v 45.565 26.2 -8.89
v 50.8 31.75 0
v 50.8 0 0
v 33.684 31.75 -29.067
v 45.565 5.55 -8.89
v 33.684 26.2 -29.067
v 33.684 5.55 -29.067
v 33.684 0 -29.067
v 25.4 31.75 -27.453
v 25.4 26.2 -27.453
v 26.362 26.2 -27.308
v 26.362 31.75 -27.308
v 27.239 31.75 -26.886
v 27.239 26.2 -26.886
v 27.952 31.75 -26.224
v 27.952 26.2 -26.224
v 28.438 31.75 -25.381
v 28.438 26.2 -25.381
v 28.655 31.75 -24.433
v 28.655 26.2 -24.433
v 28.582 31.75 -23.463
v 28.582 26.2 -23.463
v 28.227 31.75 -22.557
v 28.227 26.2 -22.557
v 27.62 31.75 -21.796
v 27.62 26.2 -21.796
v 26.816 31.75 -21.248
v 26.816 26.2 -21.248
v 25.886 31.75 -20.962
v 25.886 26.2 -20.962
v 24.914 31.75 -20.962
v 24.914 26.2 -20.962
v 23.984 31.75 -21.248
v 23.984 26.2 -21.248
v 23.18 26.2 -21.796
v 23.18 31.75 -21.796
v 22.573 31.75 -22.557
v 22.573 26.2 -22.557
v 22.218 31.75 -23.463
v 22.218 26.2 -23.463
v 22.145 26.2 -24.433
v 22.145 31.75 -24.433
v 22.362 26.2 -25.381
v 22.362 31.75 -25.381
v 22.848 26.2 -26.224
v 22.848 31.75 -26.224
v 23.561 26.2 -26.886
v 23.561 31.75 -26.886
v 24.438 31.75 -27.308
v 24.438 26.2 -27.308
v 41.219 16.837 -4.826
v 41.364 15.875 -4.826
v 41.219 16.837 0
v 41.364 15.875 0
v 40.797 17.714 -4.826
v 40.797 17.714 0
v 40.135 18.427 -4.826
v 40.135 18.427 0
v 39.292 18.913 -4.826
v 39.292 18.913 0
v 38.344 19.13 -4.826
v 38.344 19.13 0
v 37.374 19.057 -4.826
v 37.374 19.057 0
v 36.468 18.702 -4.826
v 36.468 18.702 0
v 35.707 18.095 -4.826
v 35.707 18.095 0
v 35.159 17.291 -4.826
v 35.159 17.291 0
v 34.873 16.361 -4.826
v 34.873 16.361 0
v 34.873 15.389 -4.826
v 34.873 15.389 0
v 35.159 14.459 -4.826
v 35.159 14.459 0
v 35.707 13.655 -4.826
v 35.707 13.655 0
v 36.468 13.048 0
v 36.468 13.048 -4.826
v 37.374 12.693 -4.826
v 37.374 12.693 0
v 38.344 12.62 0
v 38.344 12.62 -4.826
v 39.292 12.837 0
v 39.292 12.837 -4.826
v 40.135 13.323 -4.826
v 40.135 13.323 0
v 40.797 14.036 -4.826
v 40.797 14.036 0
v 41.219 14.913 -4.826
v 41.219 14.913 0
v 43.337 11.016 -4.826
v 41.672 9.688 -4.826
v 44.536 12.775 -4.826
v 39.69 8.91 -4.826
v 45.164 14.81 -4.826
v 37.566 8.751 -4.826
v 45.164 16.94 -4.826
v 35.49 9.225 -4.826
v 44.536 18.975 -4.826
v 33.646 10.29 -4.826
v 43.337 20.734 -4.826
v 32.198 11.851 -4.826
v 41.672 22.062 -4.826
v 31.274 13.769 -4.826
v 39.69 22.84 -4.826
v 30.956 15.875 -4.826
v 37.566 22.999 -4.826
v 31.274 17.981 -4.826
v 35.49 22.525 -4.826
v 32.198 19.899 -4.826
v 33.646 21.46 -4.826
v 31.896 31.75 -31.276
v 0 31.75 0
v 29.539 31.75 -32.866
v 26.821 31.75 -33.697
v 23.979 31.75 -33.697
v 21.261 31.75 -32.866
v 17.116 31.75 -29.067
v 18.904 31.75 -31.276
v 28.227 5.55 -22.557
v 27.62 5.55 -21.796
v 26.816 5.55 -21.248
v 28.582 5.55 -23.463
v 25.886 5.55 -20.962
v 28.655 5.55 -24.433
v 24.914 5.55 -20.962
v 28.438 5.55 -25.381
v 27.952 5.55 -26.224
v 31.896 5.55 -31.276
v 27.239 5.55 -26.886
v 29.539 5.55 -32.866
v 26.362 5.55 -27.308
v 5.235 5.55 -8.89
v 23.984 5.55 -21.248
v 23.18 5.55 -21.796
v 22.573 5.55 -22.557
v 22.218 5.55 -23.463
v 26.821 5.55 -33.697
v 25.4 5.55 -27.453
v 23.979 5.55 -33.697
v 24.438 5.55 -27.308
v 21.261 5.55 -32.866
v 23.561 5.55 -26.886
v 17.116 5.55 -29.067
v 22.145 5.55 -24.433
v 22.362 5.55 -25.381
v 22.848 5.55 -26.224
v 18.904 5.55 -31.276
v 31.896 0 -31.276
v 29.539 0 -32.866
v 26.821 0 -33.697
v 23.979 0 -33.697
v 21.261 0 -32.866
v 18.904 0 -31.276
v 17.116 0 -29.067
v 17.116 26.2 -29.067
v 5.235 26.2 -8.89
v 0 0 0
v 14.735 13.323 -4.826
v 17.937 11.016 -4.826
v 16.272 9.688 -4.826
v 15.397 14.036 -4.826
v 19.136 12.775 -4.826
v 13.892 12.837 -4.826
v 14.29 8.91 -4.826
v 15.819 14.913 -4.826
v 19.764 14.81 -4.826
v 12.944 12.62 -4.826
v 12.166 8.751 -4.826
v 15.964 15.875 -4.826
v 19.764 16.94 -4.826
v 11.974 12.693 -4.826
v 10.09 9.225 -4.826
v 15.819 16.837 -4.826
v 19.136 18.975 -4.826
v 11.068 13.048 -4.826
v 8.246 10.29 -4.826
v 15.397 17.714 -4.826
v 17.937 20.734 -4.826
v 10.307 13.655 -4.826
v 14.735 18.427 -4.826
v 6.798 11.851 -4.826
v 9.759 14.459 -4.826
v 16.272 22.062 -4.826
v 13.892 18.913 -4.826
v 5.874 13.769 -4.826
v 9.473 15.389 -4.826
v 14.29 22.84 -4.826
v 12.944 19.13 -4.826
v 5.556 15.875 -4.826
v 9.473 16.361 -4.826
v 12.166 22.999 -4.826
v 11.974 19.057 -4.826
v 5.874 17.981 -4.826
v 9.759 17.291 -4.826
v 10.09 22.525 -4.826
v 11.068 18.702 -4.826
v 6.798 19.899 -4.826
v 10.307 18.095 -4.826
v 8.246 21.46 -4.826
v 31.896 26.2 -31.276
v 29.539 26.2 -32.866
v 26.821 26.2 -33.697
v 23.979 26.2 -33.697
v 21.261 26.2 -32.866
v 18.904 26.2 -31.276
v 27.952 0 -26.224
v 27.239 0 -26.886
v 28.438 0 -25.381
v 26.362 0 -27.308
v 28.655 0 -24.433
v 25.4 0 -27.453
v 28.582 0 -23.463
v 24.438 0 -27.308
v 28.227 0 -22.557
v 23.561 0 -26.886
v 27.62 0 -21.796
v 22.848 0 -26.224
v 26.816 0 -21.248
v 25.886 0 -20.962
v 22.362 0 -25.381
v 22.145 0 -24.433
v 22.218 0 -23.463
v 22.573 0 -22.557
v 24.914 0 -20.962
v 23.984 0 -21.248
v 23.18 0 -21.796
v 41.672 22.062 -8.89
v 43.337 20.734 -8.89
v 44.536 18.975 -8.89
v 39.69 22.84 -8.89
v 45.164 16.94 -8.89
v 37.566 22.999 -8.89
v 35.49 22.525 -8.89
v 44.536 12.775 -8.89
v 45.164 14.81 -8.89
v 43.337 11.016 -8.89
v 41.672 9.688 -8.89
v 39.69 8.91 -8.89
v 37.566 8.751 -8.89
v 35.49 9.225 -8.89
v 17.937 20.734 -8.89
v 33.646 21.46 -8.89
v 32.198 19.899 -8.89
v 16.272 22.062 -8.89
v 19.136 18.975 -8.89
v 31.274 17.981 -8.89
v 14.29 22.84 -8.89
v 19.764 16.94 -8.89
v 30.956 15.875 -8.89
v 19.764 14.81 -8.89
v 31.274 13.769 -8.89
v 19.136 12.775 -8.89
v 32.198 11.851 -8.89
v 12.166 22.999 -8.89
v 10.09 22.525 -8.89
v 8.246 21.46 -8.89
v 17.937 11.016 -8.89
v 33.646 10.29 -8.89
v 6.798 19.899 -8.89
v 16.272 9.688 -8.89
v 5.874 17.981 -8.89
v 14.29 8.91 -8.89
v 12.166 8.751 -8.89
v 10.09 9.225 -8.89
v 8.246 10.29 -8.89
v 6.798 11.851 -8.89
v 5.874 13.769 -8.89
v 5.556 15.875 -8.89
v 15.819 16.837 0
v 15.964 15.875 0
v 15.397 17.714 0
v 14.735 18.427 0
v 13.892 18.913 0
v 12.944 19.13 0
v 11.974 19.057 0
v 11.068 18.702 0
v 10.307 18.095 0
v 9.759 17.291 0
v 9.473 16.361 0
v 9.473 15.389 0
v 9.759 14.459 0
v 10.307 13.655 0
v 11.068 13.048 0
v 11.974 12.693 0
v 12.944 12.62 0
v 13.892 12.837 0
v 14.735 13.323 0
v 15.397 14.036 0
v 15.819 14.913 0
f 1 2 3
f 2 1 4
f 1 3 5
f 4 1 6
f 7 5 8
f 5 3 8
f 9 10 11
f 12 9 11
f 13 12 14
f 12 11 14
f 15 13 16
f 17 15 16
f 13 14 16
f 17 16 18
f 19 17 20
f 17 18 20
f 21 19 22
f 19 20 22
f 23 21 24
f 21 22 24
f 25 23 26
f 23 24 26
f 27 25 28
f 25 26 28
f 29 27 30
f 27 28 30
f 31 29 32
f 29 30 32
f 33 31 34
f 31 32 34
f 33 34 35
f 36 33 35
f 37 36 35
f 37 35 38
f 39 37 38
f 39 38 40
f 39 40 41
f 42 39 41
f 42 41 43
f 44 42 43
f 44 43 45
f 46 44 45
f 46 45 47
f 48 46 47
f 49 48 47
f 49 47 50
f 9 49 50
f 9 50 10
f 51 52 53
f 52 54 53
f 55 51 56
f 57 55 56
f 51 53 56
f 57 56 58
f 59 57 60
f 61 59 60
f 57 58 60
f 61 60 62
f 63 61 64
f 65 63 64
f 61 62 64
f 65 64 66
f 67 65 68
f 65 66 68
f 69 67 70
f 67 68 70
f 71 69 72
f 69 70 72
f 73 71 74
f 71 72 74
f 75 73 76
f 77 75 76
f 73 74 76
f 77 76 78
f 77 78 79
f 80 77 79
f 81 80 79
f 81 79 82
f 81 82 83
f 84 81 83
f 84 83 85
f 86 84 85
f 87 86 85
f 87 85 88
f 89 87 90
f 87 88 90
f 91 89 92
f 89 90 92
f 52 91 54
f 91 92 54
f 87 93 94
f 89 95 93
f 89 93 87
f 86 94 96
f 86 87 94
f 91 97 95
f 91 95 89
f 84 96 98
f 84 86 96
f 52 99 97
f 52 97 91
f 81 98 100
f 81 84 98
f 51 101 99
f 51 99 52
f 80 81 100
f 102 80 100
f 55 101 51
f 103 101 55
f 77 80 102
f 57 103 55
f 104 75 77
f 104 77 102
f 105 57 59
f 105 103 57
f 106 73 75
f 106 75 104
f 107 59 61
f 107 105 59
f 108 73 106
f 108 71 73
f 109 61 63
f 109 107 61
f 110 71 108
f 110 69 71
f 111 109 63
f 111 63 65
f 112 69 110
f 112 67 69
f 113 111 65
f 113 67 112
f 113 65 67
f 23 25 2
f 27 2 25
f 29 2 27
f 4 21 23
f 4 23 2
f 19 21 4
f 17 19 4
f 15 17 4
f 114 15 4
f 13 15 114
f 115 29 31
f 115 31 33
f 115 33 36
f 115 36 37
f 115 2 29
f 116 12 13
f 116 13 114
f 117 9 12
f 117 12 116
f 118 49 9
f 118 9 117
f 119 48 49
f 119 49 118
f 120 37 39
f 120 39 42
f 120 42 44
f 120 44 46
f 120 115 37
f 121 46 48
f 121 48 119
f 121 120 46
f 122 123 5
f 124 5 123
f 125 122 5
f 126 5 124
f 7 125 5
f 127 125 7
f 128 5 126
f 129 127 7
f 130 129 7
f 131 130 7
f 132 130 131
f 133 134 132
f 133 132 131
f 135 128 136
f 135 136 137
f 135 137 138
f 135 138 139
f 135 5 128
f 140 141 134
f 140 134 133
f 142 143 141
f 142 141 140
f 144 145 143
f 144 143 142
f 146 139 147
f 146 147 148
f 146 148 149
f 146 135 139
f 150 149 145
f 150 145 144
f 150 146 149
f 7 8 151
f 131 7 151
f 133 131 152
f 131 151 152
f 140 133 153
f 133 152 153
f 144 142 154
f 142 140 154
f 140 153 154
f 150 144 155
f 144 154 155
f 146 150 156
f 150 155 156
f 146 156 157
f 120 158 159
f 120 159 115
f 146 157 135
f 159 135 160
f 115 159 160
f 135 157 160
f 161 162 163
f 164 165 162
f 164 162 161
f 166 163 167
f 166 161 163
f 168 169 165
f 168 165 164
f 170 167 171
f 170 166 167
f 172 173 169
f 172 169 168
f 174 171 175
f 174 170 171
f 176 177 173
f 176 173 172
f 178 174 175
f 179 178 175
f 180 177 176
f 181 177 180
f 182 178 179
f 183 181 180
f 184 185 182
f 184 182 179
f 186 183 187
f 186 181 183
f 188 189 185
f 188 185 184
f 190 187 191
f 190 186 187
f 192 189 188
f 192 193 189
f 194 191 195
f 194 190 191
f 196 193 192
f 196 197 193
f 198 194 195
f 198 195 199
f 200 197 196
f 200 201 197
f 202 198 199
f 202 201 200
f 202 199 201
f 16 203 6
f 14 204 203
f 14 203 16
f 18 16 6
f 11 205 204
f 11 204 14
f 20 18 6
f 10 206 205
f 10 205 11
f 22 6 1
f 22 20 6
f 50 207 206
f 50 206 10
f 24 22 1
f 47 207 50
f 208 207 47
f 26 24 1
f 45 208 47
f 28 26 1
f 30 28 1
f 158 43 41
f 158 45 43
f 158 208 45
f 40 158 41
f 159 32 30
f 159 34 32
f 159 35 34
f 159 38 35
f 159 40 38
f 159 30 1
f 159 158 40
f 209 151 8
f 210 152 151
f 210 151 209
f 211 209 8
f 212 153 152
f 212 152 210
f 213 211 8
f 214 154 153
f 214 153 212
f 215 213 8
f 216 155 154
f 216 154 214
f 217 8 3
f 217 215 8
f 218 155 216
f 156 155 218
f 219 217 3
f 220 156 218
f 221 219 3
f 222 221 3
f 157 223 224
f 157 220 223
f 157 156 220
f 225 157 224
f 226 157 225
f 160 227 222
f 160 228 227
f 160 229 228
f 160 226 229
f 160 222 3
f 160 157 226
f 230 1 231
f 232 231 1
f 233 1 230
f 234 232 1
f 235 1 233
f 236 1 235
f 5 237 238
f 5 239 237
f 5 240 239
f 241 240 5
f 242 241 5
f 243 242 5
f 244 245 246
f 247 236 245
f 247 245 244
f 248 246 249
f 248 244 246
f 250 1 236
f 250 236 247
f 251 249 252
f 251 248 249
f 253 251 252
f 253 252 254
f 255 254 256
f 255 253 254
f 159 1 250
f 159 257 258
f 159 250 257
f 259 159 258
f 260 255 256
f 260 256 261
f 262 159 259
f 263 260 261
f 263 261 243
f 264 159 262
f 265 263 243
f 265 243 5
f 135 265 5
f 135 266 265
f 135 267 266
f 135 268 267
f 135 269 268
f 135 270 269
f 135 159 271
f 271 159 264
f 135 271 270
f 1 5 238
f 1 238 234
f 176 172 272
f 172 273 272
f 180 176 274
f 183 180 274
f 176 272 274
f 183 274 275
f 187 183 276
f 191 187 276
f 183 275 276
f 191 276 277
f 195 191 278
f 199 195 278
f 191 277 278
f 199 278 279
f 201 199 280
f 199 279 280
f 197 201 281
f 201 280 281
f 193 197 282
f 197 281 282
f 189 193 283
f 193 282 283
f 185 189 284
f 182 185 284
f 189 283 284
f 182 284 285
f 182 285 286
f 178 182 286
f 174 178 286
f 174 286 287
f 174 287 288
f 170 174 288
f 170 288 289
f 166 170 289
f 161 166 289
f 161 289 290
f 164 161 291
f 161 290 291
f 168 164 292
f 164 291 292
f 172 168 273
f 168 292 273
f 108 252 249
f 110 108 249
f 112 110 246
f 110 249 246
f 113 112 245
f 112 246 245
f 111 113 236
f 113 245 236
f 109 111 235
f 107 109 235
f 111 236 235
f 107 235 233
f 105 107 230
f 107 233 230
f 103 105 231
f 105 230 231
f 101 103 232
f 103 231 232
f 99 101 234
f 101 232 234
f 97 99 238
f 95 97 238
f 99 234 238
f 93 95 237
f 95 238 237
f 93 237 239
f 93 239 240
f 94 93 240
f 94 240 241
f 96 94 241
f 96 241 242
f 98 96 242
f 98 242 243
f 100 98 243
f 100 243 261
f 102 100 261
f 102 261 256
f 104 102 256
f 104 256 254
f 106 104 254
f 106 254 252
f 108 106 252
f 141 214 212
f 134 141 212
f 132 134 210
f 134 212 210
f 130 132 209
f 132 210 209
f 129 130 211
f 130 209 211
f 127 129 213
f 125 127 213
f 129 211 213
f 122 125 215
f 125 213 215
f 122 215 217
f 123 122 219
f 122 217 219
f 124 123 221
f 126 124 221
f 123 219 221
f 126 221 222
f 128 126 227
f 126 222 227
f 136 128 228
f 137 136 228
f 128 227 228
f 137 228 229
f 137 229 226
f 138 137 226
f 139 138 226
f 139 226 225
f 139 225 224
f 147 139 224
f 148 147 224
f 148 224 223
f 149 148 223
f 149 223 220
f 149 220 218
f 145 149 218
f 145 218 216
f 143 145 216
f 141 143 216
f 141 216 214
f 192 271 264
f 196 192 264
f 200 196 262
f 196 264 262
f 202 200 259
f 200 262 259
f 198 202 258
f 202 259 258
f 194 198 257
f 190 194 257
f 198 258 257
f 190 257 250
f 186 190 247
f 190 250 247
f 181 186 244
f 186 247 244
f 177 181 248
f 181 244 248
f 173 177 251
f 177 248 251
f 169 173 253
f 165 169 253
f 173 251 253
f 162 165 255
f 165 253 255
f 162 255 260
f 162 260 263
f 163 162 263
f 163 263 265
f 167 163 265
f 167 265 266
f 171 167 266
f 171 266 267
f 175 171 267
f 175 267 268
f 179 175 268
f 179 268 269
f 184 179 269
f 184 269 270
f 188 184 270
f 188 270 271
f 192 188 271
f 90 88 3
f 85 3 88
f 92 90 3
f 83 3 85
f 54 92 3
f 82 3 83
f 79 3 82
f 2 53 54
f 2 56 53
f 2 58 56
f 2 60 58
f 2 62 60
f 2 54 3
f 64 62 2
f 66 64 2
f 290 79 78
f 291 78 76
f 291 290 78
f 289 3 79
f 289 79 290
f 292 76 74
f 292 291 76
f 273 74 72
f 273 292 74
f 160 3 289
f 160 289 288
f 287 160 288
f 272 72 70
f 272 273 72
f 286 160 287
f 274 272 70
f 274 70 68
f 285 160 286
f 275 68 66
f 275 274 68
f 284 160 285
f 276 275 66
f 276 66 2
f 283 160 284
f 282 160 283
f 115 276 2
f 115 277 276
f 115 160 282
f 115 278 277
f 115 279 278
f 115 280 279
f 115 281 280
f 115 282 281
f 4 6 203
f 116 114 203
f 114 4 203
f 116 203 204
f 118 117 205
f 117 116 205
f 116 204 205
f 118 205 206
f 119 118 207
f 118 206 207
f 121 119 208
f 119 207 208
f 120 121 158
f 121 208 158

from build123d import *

# Parameters (mm, degrees)
BOSS_EXTRUDE1_DEPTH                                  = 50.8
CBORE_FOR_1_4_BINDING_HEAD_MACHINE_SCREW_D           = 6.5278
CBORE_FOR_1_4_BINDING_HEAD_MACHINE_SCREW_CBORE_D     = 14.2875
CBORE_FOR_1_4_BINDING_HEAD_MACHINE_SCREW_CBORE_DEPTH = 4.064
CUT_EXTRUDE1_REACH                                   = 75.909
SKETCH4_R                                            = 3.2639


with BuildPart() as part:
    # Sketch1 → Boss-Extrude1 (new body)
    with BuildSketch(Plane(origin=(0, 0, 0), x_dir=(0, 0, -1), z_dir=(1, 0, 0))):
        Polygon((0, 0), (0, 31.75), (43.28806111, 31.75), (43.28806111, 26.2001), (8.89, 26.2001), (8.89, 5.5499), (43.28806111, 5.5499), (43.28806111, 0), align=None)
    extrude(amount=BOSS_EXTRUDE1_DEPTH)

    # CBORE for 1/4 Binding Head Machine Screw1 (through all)
    with Locations(Plane(origin=(0, 0, -8.89), x_dir=(-1, 0, 0), z_dir=(0, 0, -1))):
        with Locations((-12.7, 15.875), (-38.1, 15.875)):
            CounterBoreHole(CBORE_FOR_1_4_BINDING_HEAD_MACHINE_SCREW_D / 2, CBORE_FOR_1_4_BINDING_HEAD_MACHINE_SCREW_CBORE_D / 2, CBORE_FOR_1_4_BINDING_HEAD_MACHINE_SCREW_CBORE_DEPTH)

    # Cut-Extrude1: up to this face of the body (flat: up to its plane)
    cut_extrude1_end = Plane(part.part.faces().sort_by_distance((25.4, 31.75, -21.644030555))[0])
    # Sketch4 → Cut-Extrude1 (cut, up to the picked face)
    with BuildSketch(Plane.XZ, mode=Mode.PRIVATE) as cut_extrude1_sk1:
        with Locations(Location((25.4, -24.188970368, 0), (0, 0, 270))):
            Circle(SKETCH4_R)
    cut_extrude1_tool1 = split(extrude(cut_extrude1_sk1.sketch, amount=-CUT_EXTRUDE1_REACH, mode=Mode.PRIVATE), bisect_by=cut_extrude1_end, keep=Keep.BOTH, mode=Mode.PRIVATE)
    # Sketch4 → Cut-Extrude1 (cut, up to the picked face)
    with BuildSketch(Plane.XZ, mode=Mode.PRIVATE) as cut_extrude1_sk2:
        with BuildLine():
            Line((17.115609678, -29.067079653), (0, 0))
            Line((0, 0), (0, -43.28806111))
            Line((0, -43.28806111), (50.8, -43.28806111))
            Line((50.8, -43.28806111), (50.8, 0))
            Line((50.8, 0), (33.684390322, -29.067079653))
            ThreePointArc((33.684390322, -29.067079653), (25.4, -33.802870368), (17.115609678, -29.067079653))
        make_face()
    cut_extrude1_tool2 = split(extrude(cut_extrude1_sk2.sketch, amount=-CUT_EXTRUDE1_REACH, mode=Mode.PRIVATE), bisect_by=cut_extrude1_end, keep=Keep.BOTH, mode=Mode.PRIVATE)
    add(cut_extrude1_tool1.solids().sort_by(Axis((25.4, 0, -24.18897), (0, 1, 0)))[0], mode=Mode.SUBTRACT)
    add(cut_extrude1_tool2.solids().sort_by(Axis((7.982682, 0, -14.87219), (0, 1, 0)))[0], mode=Mode.SUBTRACT)


solid = part.part
